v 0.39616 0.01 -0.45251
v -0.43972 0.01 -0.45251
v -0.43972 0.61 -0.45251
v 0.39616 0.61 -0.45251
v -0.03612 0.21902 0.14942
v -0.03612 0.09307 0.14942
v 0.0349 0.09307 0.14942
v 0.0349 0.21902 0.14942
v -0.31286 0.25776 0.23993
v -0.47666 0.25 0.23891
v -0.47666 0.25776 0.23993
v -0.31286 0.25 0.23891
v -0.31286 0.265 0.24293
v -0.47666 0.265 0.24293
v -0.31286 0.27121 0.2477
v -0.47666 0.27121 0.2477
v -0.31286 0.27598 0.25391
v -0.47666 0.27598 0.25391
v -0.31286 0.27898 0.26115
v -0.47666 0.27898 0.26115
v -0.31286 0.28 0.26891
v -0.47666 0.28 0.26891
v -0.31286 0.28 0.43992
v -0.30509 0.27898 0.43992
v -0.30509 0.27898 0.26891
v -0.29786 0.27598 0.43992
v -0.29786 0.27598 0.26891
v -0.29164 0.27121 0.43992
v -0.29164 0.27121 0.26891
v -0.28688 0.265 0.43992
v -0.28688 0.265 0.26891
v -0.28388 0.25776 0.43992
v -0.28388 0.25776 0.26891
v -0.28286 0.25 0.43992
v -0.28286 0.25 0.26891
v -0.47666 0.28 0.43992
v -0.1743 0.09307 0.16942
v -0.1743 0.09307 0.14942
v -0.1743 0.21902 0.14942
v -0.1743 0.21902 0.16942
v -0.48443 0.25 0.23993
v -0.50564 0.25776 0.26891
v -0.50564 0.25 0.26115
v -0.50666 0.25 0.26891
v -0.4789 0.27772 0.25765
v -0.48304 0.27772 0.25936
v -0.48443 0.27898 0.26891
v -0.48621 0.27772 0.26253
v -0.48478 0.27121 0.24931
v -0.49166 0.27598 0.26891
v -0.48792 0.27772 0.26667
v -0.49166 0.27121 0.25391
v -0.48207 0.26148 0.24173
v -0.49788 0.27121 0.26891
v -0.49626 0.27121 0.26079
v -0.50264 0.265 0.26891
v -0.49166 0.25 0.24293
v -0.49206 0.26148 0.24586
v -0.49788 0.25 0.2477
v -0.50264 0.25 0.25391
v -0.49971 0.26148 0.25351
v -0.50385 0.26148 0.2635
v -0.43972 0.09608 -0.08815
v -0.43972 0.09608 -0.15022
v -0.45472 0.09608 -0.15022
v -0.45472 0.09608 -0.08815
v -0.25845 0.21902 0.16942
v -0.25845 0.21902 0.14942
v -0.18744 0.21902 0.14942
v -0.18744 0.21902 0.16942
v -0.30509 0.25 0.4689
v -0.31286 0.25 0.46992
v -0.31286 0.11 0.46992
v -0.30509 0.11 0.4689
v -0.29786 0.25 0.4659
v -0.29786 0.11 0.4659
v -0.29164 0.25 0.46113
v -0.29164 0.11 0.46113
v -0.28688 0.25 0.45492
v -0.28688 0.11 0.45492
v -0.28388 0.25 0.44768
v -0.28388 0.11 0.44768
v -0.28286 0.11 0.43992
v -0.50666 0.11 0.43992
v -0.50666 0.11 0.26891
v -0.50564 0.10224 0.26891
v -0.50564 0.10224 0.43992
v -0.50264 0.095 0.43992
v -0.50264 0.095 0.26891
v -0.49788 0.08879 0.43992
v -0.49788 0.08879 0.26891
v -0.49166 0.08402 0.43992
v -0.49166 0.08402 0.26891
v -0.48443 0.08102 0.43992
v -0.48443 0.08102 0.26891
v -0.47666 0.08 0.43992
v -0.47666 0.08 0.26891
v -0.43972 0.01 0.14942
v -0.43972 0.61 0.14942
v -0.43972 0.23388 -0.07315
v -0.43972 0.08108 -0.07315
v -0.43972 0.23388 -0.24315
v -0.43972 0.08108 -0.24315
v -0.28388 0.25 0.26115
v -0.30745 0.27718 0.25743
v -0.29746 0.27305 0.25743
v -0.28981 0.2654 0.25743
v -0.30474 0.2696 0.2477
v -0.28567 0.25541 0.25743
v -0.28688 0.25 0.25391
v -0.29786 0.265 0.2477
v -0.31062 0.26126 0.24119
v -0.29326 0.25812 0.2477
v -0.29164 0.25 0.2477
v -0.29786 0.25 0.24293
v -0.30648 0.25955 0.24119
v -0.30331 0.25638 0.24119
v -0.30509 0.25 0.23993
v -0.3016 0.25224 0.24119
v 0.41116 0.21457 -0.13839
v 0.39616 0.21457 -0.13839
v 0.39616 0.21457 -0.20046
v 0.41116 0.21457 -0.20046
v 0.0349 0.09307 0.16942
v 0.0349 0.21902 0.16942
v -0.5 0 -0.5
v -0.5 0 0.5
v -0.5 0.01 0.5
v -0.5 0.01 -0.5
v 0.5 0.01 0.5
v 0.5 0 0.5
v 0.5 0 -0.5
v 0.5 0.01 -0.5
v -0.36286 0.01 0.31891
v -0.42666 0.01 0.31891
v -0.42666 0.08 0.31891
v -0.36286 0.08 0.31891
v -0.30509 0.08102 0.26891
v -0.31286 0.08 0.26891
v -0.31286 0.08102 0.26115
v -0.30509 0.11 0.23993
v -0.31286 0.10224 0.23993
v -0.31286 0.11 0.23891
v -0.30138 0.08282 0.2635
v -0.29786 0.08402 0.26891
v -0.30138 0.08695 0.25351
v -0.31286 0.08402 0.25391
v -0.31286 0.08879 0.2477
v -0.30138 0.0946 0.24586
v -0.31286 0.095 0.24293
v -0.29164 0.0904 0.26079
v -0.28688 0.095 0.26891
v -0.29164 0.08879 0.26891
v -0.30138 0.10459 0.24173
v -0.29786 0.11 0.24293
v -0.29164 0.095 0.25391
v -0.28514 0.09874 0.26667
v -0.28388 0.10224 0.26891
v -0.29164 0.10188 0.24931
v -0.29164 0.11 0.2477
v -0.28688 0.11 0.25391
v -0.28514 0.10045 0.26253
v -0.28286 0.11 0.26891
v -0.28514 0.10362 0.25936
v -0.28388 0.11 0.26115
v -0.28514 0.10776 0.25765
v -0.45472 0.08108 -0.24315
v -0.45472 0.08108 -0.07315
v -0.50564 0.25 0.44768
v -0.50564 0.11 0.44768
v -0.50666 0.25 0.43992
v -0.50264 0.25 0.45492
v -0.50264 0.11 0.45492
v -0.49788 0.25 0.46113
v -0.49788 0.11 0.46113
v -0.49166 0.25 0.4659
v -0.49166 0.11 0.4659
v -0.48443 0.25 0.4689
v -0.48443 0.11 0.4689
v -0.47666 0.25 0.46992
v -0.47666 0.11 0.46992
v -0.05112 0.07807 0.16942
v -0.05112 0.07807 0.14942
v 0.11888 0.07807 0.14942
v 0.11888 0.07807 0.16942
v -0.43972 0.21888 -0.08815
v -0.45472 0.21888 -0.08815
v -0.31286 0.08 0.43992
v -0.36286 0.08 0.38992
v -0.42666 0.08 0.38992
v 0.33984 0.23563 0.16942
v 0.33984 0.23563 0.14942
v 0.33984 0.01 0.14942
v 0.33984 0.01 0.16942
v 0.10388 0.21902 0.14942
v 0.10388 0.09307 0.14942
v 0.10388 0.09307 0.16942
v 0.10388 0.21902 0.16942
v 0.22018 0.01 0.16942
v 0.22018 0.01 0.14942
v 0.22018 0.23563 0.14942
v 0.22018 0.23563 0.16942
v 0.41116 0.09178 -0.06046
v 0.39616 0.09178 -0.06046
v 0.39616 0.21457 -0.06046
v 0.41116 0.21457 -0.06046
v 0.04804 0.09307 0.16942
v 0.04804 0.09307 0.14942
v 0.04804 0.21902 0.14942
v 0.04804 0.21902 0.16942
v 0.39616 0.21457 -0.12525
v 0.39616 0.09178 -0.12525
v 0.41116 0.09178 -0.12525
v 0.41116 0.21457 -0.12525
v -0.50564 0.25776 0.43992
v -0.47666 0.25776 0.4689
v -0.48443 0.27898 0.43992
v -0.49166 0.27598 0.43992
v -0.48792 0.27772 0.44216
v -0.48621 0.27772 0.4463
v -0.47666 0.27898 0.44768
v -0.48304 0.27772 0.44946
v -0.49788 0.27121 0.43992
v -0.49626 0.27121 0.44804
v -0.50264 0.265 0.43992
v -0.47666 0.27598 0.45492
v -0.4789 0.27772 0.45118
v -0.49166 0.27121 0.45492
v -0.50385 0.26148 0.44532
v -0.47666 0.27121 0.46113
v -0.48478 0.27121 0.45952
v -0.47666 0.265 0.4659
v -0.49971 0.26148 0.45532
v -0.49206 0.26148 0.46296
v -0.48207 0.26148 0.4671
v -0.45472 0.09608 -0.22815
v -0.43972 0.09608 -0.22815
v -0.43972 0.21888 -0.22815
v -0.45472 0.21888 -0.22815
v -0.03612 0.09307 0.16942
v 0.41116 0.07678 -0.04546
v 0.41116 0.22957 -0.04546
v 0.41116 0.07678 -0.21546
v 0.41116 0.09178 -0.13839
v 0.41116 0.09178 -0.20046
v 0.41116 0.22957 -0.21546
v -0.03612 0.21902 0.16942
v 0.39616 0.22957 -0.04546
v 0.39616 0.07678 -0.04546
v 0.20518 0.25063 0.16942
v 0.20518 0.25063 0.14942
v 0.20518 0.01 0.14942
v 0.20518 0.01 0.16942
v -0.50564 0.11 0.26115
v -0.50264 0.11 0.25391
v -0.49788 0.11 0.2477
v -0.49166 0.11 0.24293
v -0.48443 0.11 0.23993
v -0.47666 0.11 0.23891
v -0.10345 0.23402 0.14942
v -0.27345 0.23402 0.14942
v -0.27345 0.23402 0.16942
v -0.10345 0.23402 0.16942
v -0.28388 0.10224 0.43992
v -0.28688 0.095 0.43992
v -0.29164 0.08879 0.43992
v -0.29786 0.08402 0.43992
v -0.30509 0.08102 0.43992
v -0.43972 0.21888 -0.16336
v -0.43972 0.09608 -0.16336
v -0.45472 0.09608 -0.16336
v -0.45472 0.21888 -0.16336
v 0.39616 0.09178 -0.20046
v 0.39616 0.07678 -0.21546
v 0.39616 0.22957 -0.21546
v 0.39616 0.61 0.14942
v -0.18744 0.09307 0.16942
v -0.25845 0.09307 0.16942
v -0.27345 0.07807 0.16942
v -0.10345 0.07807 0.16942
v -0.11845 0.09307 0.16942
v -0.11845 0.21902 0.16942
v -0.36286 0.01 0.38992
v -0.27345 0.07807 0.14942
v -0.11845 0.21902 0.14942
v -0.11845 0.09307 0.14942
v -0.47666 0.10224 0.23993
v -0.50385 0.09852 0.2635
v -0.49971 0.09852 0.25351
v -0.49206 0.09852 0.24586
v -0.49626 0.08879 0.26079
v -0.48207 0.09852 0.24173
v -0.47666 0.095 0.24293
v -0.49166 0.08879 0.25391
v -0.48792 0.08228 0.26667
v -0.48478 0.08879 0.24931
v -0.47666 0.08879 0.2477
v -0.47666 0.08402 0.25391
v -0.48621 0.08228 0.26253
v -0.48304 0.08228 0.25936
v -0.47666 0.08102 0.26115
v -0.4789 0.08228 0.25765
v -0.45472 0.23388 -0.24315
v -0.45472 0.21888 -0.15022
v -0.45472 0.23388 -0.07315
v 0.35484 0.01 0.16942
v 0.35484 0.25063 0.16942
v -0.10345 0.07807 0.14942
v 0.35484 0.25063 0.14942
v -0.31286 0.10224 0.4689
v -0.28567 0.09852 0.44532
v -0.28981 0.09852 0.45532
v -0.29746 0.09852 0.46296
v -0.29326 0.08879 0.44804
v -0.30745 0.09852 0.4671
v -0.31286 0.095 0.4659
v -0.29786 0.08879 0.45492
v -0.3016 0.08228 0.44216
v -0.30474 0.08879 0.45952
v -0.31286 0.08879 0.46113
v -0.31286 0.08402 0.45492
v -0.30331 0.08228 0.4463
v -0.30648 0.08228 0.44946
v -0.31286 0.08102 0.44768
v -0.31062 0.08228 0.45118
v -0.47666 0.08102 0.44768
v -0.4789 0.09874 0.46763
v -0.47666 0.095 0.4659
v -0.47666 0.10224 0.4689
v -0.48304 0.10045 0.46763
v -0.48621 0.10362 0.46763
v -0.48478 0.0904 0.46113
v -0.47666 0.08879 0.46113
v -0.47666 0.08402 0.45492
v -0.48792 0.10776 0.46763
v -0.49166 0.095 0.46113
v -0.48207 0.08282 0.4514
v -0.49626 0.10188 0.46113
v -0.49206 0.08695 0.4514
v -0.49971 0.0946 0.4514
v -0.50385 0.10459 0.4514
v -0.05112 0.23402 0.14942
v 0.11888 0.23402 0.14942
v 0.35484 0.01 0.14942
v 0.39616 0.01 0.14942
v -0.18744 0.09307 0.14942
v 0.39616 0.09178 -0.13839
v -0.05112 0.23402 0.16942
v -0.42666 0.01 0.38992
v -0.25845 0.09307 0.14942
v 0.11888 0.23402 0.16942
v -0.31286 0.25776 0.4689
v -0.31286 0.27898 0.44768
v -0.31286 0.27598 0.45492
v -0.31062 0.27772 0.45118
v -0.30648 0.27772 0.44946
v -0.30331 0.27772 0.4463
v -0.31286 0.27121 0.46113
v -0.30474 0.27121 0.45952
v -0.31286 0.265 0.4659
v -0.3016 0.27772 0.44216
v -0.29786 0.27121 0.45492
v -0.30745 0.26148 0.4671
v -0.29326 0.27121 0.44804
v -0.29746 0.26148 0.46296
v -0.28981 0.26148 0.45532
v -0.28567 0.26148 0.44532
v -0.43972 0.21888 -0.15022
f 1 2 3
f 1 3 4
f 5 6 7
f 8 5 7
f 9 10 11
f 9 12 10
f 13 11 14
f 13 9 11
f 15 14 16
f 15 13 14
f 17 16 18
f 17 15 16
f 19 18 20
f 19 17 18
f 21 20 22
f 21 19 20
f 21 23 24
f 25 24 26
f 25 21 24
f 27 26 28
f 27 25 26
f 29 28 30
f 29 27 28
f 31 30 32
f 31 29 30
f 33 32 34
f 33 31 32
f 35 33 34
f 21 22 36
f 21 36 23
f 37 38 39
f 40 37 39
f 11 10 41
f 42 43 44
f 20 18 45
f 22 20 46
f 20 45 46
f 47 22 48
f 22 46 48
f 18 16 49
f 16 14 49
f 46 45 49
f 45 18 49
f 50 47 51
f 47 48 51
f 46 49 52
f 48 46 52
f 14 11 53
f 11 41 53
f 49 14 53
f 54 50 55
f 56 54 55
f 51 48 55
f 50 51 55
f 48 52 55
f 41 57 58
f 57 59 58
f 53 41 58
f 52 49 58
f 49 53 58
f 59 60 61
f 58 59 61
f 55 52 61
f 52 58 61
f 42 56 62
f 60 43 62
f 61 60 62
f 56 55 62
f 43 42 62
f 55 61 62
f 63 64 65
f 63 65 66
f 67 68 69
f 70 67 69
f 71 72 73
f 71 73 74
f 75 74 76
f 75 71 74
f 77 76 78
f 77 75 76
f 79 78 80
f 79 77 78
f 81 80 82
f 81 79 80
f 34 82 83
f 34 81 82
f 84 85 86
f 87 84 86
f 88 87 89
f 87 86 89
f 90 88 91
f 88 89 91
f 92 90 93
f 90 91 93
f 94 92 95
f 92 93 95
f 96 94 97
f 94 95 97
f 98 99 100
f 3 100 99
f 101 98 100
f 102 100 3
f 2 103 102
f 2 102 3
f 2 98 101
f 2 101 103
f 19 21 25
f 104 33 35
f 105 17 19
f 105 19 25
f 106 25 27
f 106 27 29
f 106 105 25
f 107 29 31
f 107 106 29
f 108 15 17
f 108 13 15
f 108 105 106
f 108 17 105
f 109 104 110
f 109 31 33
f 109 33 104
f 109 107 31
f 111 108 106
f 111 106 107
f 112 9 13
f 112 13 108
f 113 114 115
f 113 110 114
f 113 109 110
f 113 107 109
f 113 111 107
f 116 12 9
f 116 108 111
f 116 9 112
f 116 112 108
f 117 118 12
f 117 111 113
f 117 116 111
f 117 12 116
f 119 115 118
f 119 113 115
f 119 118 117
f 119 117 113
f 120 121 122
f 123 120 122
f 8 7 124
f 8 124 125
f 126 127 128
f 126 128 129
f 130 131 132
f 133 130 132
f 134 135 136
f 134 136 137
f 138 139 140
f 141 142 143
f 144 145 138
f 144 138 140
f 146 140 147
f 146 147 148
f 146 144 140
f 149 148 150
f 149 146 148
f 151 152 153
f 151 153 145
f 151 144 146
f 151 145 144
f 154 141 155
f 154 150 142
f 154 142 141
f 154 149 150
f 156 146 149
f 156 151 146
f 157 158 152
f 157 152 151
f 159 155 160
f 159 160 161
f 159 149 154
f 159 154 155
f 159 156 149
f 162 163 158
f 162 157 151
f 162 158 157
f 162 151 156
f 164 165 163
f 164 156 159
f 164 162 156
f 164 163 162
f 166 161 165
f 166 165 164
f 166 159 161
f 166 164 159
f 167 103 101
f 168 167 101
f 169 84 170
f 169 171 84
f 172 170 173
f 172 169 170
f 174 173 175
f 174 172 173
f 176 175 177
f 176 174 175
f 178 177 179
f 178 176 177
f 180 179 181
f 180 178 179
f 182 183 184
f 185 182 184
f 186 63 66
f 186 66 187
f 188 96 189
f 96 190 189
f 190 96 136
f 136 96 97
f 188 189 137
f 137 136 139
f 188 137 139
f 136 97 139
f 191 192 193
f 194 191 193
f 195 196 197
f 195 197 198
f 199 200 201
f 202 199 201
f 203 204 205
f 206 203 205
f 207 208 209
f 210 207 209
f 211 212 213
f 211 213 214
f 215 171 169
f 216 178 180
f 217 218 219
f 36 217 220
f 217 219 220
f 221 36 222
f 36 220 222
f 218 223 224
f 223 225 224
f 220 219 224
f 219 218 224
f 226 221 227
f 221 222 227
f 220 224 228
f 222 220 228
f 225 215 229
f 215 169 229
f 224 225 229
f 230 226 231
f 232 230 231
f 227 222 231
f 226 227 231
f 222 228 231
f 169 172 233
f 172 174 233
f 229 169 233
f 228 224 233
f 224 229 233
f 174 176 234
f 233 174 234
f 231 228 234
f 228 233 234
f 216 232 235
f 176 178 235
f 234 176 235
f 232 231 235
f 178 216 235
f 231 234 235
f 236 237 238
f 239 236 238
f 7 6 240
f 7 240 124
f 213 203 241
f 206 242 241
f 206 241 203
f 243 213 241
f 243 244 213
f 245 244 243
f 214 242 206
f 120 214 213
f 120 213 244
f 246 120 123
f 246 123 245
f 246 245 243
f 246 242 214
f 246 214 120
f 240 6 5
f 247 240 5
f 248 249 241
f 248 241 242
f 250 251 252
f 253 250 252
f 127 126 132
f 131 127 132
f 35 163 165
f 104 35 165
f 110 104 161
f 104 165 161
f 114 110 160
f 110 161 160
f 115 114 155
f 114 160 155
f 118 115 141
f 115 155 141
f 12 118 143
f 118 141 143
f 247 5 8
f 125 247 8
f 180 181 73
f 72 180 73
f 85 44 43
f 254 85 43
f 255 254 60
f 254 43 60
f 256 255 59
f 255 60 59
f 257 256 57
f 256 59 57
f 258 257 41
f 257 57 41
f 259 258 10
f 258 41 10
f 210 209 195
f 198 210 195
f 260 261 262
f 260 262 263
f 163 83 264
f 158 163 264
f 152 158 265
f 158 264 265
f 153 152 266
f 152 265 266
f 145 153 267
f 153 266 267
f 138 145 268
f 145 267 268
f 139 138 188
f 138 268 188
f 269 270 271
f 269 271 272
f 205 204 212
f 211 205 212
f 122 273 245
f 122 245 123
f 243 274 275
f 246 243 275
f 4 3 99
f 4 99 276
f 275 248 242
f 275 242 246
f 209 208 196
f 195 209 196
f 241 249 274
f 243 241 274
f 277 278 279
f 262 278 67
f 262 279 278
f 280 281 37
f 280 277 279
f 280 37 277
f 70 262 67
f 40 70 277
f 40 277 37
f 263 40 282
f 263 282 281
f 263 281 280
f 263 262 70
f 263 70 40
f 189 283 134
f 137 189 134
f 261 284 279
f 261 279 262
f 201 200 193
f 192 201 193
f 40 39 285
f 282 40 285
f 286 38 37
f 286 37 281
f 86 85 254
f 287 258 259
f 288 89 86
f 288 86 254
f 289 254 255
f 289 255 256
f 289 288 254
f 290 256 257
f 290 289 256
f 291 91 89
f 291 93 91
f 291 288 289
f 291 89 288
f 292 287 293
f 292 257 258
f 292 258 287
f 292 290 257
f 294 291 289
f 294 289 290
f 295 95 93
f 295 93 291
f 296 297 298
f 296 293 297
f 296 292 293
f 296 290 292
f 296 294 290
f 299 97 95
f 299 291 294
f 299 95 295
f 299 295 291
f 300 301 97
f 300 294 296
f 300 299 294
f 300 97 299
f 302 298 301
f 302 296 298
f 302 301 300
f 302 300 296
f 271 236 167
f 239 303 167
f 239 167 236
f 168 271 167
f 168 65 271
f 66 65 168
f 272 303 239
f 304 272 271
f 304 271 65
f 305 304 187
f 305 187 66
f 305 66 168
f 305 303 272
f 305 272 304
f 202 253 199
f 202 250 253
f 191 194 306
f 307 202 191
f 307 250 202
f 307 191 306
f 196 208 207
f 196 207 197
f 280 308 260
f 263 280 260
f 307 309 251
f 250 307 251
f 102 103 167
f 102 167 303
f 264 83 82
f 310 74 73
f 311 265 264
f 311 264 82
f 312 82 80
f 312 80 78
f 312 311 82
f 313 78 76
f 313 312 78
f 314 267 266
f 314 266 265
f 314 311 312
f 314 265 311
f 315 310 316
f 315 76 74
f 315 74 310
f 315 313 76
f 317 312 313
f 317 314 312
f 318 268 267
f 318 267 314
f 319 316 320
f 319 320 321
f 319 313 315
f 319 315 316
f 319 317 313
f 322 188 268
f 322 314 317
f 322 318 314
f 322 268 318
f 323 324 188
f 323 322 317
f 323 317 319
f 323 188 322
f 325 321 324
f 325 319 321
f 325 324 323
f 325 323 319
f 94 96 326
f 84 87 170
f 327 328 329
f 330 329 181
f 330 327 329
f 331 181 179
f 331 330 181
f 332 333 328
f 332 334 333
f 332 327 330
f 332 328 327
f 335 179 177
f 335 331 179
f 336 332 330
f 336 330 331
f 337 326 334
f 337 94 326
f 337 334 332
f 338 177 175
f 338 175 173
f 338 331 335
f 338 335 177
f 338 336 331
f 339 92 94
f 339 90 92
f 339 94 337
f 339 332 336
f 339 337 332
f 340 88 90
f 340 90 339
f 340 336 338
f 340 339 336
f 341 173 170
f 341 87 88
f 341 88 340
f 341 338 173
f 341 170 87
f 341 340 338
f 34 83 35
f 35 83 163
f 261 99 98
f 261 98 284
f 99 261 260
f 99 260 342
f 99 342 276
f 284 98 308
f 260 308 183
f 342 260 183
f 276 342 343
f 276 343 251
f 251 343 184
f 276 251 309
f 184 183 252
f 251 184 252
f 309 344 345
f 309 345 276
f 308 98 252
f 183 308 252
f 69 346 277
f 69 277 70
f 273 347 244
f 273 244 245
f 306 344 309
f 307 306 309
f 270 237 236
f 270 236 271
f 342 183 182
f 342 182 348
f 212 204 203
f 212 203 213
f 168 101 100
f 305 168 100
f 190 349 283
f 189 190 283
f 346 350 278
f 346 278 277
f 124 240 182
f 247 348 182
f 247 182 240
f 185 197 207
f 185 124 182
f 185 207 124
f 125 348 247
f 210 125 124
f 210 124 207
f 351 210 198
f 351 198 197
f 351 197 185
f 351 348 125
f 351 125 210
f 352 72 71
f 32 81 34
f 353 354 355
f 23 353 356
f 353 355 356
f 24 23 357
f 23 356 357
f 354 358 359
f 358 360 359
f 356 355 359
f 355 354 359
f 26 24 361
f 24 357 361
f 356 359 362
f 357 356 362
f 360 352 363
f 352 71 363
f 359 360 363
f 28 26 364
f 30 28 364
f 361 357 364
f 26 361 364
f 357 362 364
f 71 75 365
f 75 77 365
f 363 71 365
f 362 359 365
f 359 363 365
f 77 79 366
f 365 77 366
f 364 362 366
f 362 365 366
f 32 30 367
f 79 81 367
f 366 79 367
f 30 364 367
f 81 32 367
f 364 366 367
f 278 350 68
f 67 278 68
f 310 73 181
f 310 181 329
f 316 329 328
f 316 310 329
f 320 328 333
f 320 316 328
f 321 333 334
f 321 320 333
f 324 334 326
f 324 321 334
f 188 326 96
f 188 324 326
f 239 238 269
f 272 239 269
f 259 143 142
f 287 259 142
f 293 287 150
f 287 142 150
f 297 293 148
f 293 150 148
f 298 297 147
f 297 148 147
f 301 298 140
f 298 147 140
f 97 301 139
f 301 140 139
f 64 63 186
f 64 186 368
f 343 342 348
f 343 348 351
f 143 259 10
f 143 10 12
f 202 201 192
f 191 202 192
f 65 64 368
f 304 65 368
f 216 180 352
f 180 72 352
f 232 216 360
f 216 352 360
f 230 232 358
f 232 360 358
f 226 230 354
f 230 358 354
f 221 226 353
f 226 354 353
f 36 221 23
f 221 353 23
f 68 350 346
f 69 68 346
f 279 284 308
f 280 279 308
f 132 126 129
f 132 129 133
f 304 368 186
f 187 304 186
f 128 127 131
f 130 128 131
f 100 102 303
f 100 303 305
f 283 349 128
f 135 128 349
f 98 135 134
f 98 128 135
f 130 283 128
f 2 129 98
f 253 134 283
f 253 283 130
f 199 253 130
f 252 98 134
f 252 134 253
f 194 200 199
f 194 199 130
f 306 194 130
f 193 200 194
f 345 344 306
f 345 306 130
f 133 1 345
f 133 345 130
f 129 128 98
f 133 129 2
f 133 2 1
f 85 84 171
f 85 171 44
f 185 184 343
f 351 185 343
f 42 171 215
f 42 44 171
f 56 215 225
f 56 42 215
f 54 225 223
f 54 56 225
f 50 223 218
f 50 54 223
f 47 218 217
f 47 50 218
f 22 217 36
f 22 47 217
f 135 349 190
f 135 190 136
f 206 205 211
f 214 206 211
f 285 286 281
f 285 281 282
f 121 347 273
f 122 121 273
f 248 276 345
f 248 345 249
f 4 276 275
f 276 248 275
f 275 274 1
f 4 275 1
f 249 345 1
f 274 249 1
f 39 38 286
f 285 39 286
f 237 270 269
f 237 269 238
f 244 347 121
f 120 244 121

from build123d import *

# Parameters (mm, degrees)
ESBO_O1_W                 = 1
ESBO_O1_H                 = 1
RESSALTO_EXTRUS_O1_DEPTH  = 0.01
ESBO_O2_W                 = 0.835884883
ESBO_O2_H                 = 0.601923969
RESSALTO_EXTRUS_O3_DEPTH  = 0.3
ESBO_O8_W                 = 0.17
ESBO_O8_H                 = 0.1527975
ESBO_O8_W_2               = 0.064789378
ESBO_O8_H_2               = 0.1227975
ESBO_O8_W_3               = 0.0620701
RESSALTO_EXTRUS_O7_DEPTH  = 0.015
ESBO_O7_W                 = 0.17
ESBO_O7_H                 = 0.1527975
ESBO_O7_W_2               = 0.064789378
ESBO_O7_H_2               = 0.1227975
ESBO_O7_W_3               = 0.0620701
RESSALTO_EXTRUS_O8_DEPTH  = 0.015
ESBO_O9_W                 = 0.063807516
ESBO_O9_H                 = 0.071007721
RESSALTO_EXTRUS_O10_DEPTH = 0.07
ESBO_O11_W                = 0.223807516
ESBO_O11_H                = 0.231007721
RESSALTO_EXTRUS_O11_DEPTH = 0.2
FILETE2_R                 = 0.03
FILETE3_R                 = 0.03
ESBO_O6_W                 = 0.17
ESBO_O6_H                 = 0.15594777
ESBO_O6_W_2               = 0.055847654
ESBO_O6_H_2               = 0.12594777
ESBO_O6_W_3               = 0.071011824
ESBO_O6_W_4               = 0.055847655
ESBO_O6_W_5               = 0.071011823
RESSALTO_EXTRUS_O12_DEPTH = 0.02
ESBO_O12_W                = 0.835884883
ESBO_O12_H                = 0.601923969
RESSALTO_EXTRUS_O13_DEPTH = 0.3


with BuildPart() as part:
    # Esboço1 → Ressalto-extrusão1 (new body)
    with BuildSketch(Plane(origin=(0, 0, 0), x_dir=(1, 0, 0), z_dir=(0, 1, 0))):
        Rectangle(ESBO_O1_W, ESBO_O1_H)
    extrude(amount=RESSALTO_EXTRUS_O1_DEPTH)

    # Esboço2 → Ressalto-extrusão3 (add)
    with BuildSketch(Plane(origin=(0, 0.01, 0), x_dir=(1, 0, 0), z_dir=(0, 1, 0))):
        with Locations((-0.021781552, 0.151543531)):
            Rectangle(ESBO_O2_W, ESBO_O2_H)
    extrude(amount=RESSALTO_EXTRUS_O3_DEPTH)

    # Esboço8 → Ressalto-extrusão7 (add)
    with BuildSketch(Plane(origin=(0.396160889, 0, 0), x_dir=(0, 0, -1), z_dir=(1, 0, 0))):
        with Locations((0.130456206, 0.153176171)):
            Rectangle(ESBO_O8_W, ESBO_O8_H)
        with Locations((0.092850895, 0.153176171)):
            Rectangle(ESBO_O8_W_2, ESBO_O8_H_2, mode=Mode.SUBTRACT)
        with Locations((0.169421156, 0.153176171)):
            Rectangle(ESBO_O8_W_3, ESBO_O8_H_2, mode=Mode.SUBTRACT)
    extrude(amount=RESSALTO_EXTRUS_O7_DEPTH)

    # Esboço7 → Ressalto-extrusão8 (add)
    with BuildSketch(Plane.ZY.offset(0.439723994)):
        with Locations((-0.158153325, 0.157477131)):
            Rectangle(ESBO_O7_W, ESBO_O7_H)
        with Locations((-0.195758636, 0.157477131)):
            Rectangle(ESBO_O7_W_2, ESBO_O7_H_2, mode=Mode.SUBTRACT)
        with Locations((-0.119188375, 0.157477131)):
            Rectangle(ESBO_O7_W_3, ESBO_O7_H_2, mode=Mode.SUBTRACT)
    extrude(amount=RESSALTO_EXTRUS_O8_DEPTH)

    # Esboço9 → Ressalto-extrusão10 (add)
    with BuildSketch(Plane(origin=(0, 0.01, 0), x_dir=(1, 0, 0), z_dir=(0, 1, 0))):
        with Locations((-0.394760136, -0.354413696)):
            Rectangle(ESBO_O9_W, ESBO_O9_H)
    extrude(amount=RESSALTO_EXTRUS_O10_DEPTH)

    # Esboço11 → Ressalto-extrusão11 (add)
    with BuildSketch(Plane(origin=(0, 0.08, 0), x_dir=(1, 0, 0), z_dir=(0, 1, 0))):
        with Locations((-0.394760136, -0.354413696)):
            Rectangle(ESBO_O11_W, ESBO_O11_H)
    extrude(amount=RESSALTO_EXTRUS_O11_DEPTH)

    # Filete2
    filete2_edges = [part.edges().sort_by_distance(p)[0] for p in [
        (-0.506663894, 0.08, 0.354413695),
        (-0.506663894, 0.18, 0.238909835),
        (-0.394760136, 0.08, 0.469917556),
        (-0.506663894, 0.18, 0.469917556),
        (-0.282856378, 0.18, 0.469917556),
        (-0.394760136, 0.28, 0.238909835),
        (-0.506663894, 0.28, 0.354413695),
        (-0.394760136, 0.28, 0.469917556),
        (-0.282856378, 0.28, 0.354413695),
    ]]
    fillet(filete2_edges, radius=FILETE2_R)

    # Filete3
    # the kernel refuses this fillet: 0.03 mm, written as the material it takes off along each edge
    with BuildSketch(Plane(origin=(-0.476663894, 0.11, 0.268909835), x_dir=(0, 0, -1), z_dir=(0, -1, 0))) as filete3_piece_1_section:
        Polygon((0, 0), (FILETE3_R, 0), (FILETE3_R, -FILETE3_R), (0, -FILETE3_R), align=None)
    filete3_piece_1 = extrude(amount=FILETE3_R, mode=Mode.PRIVATE)
    filete3_piece_1 = filete3_piece_1 - Plane(origin=(-0.476663894, 0.11, 0.268909835), x_dir=(0.7071067811865475, 0, 0.7071067811865475), z_dir=(0, -1, 0)) * Sphere(FILETE3_R, mode=Mode.PRIVATE)
    add(filete3_piece_1, mode=Mode.SUBTRACT)
    with BuildSketch(Plane(origin=(-0.312856378, 0.25, 0.268909835), x_dir=(1, 0, 0), z_dir=(0, 0, -1))) as filete3_piece_2_section:
        Polygon((0, 0), (FILETE3_R, 0), (FILETE3_R, -FILETE3_R), (0, -FILETE3_R), align=None)
    filete3_piece_2 = extrude(amount=FILETE3_R, mode=Mode.PRIVATE)
    filete3_piece_2 = filete3_piece_2 - Plane(origin=(-0.312856378, 0.25, 0.268909835), x_dir=(-0.7071067811865475, -0.7071067811865475, 0), z_dir=(0, 0, -1)) * Sphere(FILETE3_R, mode=Mode.PRIVATE)
    add(filete3_piece_2, mode=Mode.SUBTRACT)
    with BuildSketch(Plane(origin=(-0.312856378, 0.11, 0.439917556), x_dir=(1, 0, 0), z_dir=(0, -1, 0))) as filete3_piece_3_section:
        Polygon((0, 0), (FILETE3_R, 0), (FILETE3_R, FILETE3_R), (0, FILETE3_R), align=None)
    filete3_piece_3 = extrude(amount=FILETE3_R, mode=Mode.PRIVATE)
    filete3_piece_3 = filete3_piece_3 - Plane(origin=(-0.312856378, 0.11, 0.439917556), x_dir=(-0.7071067811865475, 0, -0.7071067811865475), z_dir=(0, -1, 0)) * Sphere(FILETE3_R, mode=Mode.PRIVATE)
    add(filete3_piece_3, mode=Mode.SUBTRACT)
    with BuildSketch(Plane(origin=(-0.312856378, 0.11, 0.268909835), x_dir=(0, -1, 0), z_dir=(1, 0, 0))) as filete3_piece_4_section:
        Polygon((0, 0), (FILETE3_R, 0), (FILETE3_R, FILETE3_R), (0, FILETE3_R), align=None)
    filete3_piece_4 = extrude(amount=FILETE3_R, mode=Mode.PRIVATE)
    filete3_piece_4 = filete3_piece_4 - Plane(origin=(-0.312856378, 0.11, 0.268909835), x_dir=(0, 0.7071067811865475, 0.7071067811865475), z_dir=(1, 0, 0)) * Sphere(FILETE3_R, mode=Mode.PRIVATE)
    add(filete3_piece_4, mode=Mode.SUBTRACT)
    with BuildSketch(Plane(origin=(-0.312856378, 0.08, 0.238909835), x_dir=(0, 0, 1), z_dir=(-1, 0, 0))) as filete3_piece_5:
        with BuildLine():
            CenterArc((FILETE3_R, FILETE3_R), FILETE3_R, 180, 90)
            Line((0, FILETE3_R), (0, 0))
            Line((0, 0), (FILETE3_R, 0))
        make_face()
    extrude(amount=0.163807516, mode=Mode.SUBTRACT)
    with BuildSketch(Plane(origin=(-0.282856378, 0.08, 0.439917556), x_dir=(-1, 0, 0), z_dir=(0, 0, -1))) as filete3_piece_6:
        with BuildLine():
            CenterArc((FILETE3_R, FILETE3_R), FILETE3_R, 180, 90)
            Line((0, FILETE3_R), (0, 0))
            Line((0, 0), (FILETE3_R, 0))
        make_face()
    extrude(amount=0.171007722, mode=Mode.SUBTRACT)
    with BuildSketch(Plane(origin=(-0.282856378, 0.11, 0.238909835), x_dir=(-1, 0, 0), z_dir=(0, 1, 0))) as filete3_piece_7:
        with BuildLine():
            CenterArc((FILETE3_R, FILETE3_R), FILETE3_R, 180, 90)
            Line((0, FILETE3_R), (0, 0))
            Line((0, 0), (FILETE3_R, 0))
        make_face()
    extrude(amount=0.14, mode=Mode.SUBTRACT)

    # Esboço6 → Ressalto-extrusão12 (add)
    # profile 1 of 3: a face of its own
    with BuildSketch(Plane.XY.offset(0.149418454)):
        with Locations((0.033883439, 0.156046001)):
            Rectangle(ESBO_O6_W, ESBO_O6_H)
        with Locations((0.075959612, 0.156046001)):
            Rectangle(ESBO_O6_W_2, ESBO_O6_H_2, mode=Mode.SUBTRACT)
        with Locations((-0.000610649, 0.156046001)):
            Rectangle(ESBO_O6_W_3, ESBO_O6_H_2, mode=Mode.SUBTRACT)
    # profile 2 of 3: a face of its own
    with BuildSketch(Plane.XY.offset(0.149418454)):
        Polygon((0.205177687, 0.01), (0.220177687, 0.01), (0.220177687, 0.235633321), (0.339843806, 0.235633321), (0.339843806, 0.01), (0.354843806, 0.01), (0.354843806, 0.250633321), (0.205177687, 0.250633321), align=None)
    # profile 3 of 3: a face of its own
    with BuildSketch(Plane.XY.offset(0.149418454)):
        with Locations((-0.188447602, 0.156046001)):
            Rectangle(ESBO_O6_W, ESBO_O6_H)
        with Locations((-0.14637143, 0.156046001)):
            Rectangle(ESBO_O6_W_4, ESBO_O6_H_2, mode=Mode.SUBTRACT)
        with Locations((-0.222941691, 0.156046001)):
            Rectangle(ESBO_O6_W_5, ESBO_O6_H_2, mode=Mode.SUBTRACT)
    extrude(amount=RESSALTO_EXTRUS_O12_DEPTH)

    # Esboço12 → Ressalto-extrusão13 (add)
    with BuildSketch(Plane(origin=(0, 0.31, 0), x_dir=(1, 0, 0), z_dir=(0, 1, 0))):
        with Locations((-0.021781552, 0.151543531)):
            Rectangle(ESBO_O12_W, ESBO_O12_H)
    extrude(amount=RESSALTO_EXTRUS_O13_DEPTH)


solid = part.part
